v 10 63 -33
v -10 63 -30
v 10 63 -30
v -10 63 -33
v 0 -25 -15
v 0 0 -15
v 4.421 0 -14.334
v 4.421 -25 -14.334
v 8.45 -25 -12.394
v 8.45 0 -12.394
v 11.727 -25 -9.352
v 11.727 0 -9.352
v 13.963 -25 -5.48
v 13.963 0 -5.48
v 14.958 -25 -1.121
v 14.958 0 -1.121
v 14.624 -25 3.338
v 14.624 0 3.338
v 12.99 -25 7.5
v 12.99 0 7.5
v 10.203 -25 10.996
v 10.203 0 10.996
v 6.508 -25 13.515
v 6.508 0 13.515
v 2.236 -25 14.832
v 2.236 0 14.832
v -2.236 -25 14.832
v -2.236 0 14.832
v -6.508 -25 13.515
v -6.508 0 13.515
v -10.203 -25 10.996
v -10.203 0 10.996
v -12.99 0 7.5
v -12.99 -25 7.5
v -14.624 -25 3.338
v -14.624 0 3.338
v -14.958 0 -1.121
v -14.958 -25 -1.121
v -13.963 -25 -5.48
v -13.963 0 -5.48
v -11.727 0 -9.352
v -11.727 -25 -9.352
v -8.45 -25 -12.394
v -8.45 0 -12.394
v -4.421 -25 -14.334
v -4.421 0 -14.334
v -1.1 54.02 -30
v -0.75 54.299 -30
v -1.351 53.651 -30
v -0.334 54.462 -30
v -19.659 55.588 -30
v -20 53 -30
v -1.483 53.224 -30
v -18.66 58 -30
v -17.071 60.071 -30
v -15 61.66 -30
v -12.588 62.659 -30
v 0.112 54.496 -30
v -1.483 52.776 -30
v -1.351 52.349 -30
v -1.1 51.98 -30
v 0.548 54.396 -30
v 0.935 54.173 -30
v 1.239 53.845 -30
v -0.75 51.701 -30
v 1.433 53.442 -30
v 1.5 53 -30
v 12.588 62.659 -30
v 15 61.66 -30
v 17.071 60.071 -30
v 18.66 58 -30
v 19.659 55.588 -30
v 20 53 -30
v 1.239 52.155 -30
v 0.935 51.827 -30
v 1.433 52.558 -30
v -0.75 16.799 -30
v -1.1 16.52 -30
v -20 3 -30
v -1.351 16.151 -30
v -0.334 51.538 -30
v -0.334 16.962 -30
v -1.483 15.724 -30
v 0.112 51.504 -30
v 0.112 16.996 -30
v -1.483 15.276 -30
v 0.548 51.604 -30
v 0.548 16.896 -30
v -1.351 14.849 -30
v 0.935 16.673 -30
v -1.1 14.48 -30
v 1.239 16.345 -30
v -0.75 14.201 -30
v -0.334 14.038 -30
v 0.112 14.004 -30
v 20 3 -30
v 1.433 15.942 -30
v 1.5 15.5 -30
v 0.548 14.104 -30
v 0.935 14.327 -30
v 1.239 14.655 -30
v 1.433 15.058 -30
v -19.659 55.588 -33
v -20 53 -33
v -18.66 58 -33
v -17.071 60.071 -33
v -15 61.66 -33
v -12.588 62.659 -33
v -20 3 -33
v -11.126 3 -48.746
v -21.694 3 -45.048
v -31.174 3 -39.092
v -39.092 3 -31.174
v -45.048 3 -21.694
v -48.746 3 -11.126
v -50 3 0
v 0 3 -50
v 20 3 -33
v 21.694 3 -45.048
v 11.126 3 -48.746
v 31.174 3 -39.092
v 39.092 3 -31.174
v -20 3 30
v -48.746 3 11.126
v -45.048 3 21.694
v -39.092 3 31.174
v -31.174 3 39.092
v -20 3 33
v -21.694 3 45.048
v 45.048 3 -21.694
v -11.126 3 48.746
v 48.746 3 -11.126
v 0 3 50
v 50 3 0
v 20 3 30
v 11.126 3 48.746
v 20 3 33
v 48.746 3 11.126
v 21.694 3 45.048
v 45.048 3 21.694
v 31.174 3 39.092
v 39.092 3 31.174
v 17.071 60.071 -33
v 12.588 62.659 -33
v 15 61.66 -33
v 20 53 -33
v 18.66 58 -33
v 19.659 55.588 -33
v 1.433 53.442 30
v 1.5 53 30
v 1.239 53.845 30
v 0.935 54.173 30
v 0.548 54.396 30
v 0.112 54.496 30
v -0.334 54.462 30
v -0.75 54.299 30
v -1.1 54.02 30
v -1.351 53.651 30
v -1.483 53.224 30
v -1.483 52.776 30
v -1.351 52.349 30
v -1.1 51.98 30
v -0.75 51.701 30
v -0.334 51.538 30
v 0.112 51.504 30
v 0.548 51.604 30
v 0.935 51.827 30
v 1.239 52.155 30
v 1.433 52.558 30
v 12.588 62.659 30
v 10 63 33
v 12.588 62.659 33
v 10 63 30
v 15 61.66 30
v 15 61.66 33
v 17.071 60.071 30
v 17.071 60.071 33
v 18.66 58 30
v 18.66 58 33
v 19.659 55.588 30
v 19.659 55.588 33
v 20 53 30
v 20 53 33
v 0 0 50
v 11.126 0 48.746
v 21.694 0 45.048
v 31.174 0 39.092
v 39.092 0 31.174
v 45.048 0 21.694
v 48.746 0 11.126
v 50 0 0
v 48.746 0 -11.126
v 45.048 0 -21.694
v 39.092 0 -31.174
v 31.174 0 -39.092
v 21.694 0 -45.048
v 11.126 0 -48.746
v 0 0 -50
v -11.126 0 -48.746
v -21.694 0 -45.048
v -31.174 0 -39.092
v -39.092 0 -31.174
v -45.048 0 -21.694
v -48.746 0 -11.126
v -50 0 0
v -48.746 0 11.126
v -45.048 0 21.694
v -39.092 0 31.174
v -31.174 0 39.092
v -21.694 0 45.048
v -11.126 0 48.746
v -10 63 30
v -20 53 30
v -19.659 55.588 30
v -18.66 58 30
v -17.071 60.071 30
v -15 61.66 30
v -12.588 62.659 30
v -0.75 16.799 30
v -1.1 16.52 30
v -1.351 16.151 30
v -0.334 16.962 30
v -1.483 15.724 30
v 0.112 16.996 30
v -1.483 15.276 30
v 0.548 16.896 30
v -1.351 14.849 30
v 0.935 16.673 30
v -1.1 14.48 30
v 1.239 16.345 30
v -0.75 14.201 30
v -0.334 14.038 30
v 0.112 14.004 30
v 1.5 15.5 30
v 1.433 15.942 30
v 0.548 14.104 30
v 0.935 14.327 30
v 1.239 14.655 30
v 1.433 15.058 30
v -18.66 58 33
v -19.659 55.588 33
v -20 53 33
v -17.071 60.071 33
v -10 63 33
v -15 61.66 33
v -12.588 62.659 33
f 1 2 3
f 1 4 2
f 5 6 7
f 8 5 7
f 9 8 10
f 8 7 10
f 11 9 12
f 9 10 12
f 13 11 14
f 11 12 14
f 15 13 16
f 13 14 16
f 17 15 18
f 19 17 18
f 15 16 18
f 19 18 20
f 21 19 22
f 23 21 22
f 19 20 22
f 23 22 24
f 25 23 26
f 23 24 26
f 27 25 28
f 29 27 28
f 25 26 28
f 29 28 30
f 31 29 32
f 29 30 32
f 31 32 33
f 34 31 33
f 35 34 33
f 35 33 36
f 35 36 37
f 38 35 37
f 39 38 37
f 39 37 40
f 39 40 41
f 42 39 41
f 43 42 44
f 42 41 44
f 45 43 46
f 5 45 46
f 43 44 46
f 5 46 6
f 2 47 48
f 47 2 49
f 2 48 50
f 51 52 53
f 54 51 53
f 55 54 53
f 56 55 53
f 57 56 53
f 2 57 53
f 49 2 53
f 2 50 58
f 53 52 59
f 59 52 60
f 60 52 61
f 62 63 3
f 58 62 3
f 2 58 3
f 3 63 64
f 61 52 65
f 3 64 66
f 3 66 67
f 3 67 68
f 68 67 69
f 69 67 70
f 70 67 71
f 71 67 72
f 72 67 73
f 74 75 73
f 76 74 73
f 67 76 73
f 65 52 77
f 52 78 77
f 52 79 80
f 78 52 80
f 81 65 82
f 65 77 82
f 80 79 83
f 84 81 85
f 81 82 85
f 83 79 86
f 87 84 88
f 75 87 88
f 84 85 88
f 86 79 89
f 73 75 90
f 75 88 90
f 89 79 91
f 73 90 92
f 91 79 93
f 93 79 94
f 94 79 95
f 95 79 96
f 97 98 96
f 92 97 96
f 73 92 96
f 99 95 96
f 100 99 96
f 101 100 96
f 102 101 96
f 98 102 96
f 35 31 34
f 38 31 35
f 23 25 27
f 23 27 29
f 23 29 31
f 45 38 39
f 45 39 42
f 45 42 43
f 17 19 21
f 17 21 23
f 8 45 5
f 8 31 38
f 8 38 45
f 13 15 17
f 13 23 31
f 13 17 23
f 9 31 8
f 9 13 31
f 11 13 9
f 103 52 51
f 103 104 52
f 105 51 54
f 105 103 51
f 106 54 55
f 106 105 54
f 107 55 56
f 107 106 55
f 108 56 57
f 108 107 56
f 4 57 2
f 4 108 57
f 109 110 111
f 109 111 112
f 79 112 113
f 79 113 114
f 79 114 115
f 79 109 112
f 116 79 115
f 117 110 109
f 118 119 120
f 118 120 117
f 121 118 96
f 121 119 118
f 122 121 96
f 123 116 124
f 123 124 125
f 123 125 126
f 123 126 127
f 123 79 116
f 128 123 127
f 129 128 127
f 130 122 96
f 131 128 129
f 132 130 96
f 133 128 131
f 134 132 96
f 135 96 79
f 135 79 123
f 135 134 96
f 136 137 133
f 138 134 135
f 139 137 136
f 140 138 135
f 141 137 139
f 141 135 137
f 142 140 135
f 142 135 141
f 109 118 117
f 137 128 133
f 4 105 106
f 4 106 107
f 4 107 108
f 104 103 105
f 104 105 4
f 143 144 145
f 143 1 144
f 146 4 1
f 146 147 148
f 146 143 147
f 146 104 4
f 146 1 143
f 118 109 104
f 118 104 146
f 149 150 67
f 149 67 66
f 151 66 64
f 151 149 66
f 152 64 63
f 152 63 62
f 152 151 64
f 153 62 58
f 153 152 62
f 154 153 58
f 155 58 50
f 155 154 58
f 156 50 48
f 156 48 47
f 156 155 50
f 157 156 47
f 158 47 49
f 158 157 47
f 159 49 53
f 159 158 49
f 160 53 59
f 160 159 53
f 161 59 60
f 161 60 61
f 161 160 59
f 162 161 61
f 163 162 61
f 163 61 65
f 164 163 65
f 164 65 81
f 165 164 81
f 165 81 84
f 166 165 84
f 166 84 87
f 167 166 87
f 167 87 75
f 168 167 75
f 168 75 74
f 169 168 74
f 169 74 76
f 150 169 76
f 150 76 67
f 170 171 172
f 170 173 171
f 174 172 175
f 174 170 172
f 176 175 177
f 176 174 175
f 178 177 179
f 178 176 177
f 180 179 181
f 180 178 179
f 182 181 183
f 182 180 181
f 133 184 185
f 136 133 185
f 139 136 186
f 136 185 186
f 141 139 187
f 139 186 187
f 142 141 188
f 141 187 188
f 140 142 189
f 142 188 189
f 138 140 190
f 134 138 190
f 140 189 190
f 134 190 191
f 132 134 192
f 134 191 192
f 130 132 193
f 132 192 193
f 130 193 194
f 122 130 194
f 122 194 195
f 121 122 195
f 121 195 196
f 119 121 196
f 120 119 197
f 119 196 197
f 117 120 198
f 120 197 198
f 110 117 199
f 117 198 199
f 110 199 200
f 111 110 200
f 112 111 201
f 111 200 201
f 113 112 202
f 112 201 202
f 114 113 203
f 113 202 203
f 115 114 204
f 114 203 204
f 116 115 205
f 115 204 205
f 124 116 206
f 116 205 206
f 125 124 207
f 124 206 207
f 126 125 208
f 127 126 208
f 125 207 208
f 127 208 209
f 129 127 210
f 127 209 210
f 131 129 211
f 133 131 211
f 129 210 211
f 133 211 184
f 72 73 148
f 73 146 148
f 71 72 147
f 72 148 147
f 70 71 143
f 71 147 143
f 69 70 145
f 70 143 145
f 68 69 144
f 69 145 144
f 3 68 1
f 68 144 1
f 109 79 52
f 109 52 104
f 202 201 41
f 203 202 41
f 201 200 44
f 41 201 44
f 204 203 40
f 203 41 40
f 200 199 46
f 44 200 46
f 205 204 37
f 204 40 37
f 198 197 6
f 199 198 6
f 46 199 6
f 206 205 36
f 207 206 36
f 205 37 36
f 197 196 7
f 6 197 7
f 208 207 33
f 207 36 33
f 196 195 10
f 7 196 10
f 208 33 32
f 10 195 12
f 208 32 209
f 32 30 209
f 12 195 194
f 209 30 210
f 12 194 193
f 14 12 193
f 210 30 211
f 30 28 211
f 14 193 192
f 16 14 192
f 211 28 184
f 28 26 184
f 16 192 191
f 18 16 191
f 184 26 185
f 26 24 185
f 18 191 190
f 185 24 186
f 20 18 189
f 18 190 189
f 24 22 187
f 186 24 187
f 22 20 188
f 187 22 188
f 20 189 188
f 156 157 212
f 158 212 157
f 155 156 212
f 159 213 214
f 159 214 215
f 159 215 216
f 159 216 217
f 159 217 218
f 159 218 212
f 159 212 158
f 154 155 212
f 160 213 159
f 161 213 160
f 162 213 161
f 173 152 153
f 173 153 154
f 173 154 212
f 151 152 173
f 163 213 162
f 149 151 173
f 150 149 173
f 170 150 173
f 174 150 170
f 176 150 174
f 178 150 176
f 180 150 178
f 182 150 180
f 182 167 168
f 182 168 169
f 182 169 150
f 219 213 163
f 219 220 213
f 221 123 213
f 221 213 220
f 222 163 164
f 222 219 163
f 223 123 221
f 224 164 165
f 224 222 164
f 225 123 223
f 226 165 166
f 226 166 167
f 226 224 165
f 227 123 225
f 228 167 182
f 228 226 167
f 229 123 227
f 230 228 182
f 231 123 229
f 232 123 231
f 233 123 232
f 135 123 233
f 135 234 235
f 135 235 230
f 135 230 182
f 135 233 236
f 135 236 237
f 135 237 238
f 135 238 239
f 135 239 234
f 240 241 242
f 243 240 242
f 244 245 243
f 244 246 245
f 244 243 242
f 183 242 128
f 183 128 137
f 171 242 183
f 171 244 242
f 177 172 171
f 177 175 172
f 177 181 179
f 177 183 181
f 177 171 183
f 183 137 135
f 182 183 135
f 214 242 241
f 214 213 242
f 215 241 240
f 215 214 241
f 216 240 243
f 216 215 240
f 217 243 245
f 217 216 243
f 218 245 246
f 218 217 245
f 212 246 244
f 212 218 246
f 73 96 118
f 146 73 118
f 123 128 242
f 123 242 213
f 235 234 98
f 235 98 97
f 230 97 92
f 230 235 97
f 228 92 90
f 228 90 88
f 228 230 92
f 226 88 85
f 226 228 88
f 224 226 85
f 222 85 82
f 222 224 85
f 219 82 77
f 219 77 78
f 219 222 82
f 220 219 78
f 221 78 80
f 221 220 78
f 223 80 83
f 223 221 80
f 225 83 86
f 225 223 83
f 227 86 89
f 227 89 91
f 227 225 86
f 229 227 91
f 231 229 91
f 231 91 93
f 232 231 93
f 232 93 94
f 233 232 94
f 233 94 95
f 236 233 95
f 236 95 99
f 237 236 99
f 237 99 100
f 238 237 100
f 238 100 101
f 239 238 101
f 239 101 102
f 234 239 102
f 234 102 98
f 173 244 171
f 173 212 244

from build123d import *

# Parameters (mm, degrees)
SKETCH1_R           = 50
BOSS_EXTRUDE1_DEPTH = 3
SKETCH2_R           = 15
BOSS_EXTRUDE2_DEPTH = 25
SKETCH3_W           = 40
SKETCH3_H           = 3
BOSS_EXTRUDE3_DEPTH = 60
SKETCH4_R           = 1.5
BOSS_EXTRUDE4_DEPTH = 63
FILLET1_R           = 10


with BuildPart() as part:
    # Sketch1 → Boss-Extrude1 (new body)
    with BuildSketch(Plane(origin=(0, 0, 0), x_dir=(1, 0, 0), z_dir=(0, 1, 0))):
        with Locations(Location((0, 0, 0), (0, 0, 270))):
            Circle(SKETCH1_R)
    extrude(amount=BOSS_EXTRUDE1_DEPTH)

    # Sketch2 → Boss-Extrude2 (add)
    with BuildSketch(Plane(origin=(0, 0, 0), x_dir=(-1, 0, 0), z_dir=(0, -1, 0))):
        with Locations(Location((0, 0, 0), (0, 0, 90))):
            Circle(SKETCH2_R)
    extrude(amount=BOSS_EXTRUDE2_DEPTH)

    # Sketch3 → Boss-Extrude3 (add)
    with BuildSketch(Plane(origin=(0, 3, 0), x_dir=(1, 0, 0), z_dir=(0, 1, 0))):
        with Locations((0, -31.5)):
            Rectangle(SKETCH3_W, SKETCH3_H)
        with Locations((0, 31.5)):
            Rectangle(SKETCH3_W, SKETCH3_H)
    extrude(amount=BOSS_EXTRUDE3_DEPTH)

    # Sketch4 → Boss-Extrude4 (add)
    with BuildSketch(Plane.XY.offset(33)):
        with Locations((0, 53)):
            Circle(SKETCH4_R)
        with Locations((0, 15.5)):
            Circle(SKETCH4_R)
    extrude(amount=-BOSS_EXTRUDE4_DEPTH)

    # Fillet1
    fillet1_edges = [part.edges().sort_by_distance(p)[0] for p in [
        (-20, 63, 31.5),
        (20, 63, 31.5),
        (-20, 63, -31.5),
        (20, 63, -31.5),
    ]]
    fillet(fillet1_edges, radius=FILLET1_R)


solid = part.part
